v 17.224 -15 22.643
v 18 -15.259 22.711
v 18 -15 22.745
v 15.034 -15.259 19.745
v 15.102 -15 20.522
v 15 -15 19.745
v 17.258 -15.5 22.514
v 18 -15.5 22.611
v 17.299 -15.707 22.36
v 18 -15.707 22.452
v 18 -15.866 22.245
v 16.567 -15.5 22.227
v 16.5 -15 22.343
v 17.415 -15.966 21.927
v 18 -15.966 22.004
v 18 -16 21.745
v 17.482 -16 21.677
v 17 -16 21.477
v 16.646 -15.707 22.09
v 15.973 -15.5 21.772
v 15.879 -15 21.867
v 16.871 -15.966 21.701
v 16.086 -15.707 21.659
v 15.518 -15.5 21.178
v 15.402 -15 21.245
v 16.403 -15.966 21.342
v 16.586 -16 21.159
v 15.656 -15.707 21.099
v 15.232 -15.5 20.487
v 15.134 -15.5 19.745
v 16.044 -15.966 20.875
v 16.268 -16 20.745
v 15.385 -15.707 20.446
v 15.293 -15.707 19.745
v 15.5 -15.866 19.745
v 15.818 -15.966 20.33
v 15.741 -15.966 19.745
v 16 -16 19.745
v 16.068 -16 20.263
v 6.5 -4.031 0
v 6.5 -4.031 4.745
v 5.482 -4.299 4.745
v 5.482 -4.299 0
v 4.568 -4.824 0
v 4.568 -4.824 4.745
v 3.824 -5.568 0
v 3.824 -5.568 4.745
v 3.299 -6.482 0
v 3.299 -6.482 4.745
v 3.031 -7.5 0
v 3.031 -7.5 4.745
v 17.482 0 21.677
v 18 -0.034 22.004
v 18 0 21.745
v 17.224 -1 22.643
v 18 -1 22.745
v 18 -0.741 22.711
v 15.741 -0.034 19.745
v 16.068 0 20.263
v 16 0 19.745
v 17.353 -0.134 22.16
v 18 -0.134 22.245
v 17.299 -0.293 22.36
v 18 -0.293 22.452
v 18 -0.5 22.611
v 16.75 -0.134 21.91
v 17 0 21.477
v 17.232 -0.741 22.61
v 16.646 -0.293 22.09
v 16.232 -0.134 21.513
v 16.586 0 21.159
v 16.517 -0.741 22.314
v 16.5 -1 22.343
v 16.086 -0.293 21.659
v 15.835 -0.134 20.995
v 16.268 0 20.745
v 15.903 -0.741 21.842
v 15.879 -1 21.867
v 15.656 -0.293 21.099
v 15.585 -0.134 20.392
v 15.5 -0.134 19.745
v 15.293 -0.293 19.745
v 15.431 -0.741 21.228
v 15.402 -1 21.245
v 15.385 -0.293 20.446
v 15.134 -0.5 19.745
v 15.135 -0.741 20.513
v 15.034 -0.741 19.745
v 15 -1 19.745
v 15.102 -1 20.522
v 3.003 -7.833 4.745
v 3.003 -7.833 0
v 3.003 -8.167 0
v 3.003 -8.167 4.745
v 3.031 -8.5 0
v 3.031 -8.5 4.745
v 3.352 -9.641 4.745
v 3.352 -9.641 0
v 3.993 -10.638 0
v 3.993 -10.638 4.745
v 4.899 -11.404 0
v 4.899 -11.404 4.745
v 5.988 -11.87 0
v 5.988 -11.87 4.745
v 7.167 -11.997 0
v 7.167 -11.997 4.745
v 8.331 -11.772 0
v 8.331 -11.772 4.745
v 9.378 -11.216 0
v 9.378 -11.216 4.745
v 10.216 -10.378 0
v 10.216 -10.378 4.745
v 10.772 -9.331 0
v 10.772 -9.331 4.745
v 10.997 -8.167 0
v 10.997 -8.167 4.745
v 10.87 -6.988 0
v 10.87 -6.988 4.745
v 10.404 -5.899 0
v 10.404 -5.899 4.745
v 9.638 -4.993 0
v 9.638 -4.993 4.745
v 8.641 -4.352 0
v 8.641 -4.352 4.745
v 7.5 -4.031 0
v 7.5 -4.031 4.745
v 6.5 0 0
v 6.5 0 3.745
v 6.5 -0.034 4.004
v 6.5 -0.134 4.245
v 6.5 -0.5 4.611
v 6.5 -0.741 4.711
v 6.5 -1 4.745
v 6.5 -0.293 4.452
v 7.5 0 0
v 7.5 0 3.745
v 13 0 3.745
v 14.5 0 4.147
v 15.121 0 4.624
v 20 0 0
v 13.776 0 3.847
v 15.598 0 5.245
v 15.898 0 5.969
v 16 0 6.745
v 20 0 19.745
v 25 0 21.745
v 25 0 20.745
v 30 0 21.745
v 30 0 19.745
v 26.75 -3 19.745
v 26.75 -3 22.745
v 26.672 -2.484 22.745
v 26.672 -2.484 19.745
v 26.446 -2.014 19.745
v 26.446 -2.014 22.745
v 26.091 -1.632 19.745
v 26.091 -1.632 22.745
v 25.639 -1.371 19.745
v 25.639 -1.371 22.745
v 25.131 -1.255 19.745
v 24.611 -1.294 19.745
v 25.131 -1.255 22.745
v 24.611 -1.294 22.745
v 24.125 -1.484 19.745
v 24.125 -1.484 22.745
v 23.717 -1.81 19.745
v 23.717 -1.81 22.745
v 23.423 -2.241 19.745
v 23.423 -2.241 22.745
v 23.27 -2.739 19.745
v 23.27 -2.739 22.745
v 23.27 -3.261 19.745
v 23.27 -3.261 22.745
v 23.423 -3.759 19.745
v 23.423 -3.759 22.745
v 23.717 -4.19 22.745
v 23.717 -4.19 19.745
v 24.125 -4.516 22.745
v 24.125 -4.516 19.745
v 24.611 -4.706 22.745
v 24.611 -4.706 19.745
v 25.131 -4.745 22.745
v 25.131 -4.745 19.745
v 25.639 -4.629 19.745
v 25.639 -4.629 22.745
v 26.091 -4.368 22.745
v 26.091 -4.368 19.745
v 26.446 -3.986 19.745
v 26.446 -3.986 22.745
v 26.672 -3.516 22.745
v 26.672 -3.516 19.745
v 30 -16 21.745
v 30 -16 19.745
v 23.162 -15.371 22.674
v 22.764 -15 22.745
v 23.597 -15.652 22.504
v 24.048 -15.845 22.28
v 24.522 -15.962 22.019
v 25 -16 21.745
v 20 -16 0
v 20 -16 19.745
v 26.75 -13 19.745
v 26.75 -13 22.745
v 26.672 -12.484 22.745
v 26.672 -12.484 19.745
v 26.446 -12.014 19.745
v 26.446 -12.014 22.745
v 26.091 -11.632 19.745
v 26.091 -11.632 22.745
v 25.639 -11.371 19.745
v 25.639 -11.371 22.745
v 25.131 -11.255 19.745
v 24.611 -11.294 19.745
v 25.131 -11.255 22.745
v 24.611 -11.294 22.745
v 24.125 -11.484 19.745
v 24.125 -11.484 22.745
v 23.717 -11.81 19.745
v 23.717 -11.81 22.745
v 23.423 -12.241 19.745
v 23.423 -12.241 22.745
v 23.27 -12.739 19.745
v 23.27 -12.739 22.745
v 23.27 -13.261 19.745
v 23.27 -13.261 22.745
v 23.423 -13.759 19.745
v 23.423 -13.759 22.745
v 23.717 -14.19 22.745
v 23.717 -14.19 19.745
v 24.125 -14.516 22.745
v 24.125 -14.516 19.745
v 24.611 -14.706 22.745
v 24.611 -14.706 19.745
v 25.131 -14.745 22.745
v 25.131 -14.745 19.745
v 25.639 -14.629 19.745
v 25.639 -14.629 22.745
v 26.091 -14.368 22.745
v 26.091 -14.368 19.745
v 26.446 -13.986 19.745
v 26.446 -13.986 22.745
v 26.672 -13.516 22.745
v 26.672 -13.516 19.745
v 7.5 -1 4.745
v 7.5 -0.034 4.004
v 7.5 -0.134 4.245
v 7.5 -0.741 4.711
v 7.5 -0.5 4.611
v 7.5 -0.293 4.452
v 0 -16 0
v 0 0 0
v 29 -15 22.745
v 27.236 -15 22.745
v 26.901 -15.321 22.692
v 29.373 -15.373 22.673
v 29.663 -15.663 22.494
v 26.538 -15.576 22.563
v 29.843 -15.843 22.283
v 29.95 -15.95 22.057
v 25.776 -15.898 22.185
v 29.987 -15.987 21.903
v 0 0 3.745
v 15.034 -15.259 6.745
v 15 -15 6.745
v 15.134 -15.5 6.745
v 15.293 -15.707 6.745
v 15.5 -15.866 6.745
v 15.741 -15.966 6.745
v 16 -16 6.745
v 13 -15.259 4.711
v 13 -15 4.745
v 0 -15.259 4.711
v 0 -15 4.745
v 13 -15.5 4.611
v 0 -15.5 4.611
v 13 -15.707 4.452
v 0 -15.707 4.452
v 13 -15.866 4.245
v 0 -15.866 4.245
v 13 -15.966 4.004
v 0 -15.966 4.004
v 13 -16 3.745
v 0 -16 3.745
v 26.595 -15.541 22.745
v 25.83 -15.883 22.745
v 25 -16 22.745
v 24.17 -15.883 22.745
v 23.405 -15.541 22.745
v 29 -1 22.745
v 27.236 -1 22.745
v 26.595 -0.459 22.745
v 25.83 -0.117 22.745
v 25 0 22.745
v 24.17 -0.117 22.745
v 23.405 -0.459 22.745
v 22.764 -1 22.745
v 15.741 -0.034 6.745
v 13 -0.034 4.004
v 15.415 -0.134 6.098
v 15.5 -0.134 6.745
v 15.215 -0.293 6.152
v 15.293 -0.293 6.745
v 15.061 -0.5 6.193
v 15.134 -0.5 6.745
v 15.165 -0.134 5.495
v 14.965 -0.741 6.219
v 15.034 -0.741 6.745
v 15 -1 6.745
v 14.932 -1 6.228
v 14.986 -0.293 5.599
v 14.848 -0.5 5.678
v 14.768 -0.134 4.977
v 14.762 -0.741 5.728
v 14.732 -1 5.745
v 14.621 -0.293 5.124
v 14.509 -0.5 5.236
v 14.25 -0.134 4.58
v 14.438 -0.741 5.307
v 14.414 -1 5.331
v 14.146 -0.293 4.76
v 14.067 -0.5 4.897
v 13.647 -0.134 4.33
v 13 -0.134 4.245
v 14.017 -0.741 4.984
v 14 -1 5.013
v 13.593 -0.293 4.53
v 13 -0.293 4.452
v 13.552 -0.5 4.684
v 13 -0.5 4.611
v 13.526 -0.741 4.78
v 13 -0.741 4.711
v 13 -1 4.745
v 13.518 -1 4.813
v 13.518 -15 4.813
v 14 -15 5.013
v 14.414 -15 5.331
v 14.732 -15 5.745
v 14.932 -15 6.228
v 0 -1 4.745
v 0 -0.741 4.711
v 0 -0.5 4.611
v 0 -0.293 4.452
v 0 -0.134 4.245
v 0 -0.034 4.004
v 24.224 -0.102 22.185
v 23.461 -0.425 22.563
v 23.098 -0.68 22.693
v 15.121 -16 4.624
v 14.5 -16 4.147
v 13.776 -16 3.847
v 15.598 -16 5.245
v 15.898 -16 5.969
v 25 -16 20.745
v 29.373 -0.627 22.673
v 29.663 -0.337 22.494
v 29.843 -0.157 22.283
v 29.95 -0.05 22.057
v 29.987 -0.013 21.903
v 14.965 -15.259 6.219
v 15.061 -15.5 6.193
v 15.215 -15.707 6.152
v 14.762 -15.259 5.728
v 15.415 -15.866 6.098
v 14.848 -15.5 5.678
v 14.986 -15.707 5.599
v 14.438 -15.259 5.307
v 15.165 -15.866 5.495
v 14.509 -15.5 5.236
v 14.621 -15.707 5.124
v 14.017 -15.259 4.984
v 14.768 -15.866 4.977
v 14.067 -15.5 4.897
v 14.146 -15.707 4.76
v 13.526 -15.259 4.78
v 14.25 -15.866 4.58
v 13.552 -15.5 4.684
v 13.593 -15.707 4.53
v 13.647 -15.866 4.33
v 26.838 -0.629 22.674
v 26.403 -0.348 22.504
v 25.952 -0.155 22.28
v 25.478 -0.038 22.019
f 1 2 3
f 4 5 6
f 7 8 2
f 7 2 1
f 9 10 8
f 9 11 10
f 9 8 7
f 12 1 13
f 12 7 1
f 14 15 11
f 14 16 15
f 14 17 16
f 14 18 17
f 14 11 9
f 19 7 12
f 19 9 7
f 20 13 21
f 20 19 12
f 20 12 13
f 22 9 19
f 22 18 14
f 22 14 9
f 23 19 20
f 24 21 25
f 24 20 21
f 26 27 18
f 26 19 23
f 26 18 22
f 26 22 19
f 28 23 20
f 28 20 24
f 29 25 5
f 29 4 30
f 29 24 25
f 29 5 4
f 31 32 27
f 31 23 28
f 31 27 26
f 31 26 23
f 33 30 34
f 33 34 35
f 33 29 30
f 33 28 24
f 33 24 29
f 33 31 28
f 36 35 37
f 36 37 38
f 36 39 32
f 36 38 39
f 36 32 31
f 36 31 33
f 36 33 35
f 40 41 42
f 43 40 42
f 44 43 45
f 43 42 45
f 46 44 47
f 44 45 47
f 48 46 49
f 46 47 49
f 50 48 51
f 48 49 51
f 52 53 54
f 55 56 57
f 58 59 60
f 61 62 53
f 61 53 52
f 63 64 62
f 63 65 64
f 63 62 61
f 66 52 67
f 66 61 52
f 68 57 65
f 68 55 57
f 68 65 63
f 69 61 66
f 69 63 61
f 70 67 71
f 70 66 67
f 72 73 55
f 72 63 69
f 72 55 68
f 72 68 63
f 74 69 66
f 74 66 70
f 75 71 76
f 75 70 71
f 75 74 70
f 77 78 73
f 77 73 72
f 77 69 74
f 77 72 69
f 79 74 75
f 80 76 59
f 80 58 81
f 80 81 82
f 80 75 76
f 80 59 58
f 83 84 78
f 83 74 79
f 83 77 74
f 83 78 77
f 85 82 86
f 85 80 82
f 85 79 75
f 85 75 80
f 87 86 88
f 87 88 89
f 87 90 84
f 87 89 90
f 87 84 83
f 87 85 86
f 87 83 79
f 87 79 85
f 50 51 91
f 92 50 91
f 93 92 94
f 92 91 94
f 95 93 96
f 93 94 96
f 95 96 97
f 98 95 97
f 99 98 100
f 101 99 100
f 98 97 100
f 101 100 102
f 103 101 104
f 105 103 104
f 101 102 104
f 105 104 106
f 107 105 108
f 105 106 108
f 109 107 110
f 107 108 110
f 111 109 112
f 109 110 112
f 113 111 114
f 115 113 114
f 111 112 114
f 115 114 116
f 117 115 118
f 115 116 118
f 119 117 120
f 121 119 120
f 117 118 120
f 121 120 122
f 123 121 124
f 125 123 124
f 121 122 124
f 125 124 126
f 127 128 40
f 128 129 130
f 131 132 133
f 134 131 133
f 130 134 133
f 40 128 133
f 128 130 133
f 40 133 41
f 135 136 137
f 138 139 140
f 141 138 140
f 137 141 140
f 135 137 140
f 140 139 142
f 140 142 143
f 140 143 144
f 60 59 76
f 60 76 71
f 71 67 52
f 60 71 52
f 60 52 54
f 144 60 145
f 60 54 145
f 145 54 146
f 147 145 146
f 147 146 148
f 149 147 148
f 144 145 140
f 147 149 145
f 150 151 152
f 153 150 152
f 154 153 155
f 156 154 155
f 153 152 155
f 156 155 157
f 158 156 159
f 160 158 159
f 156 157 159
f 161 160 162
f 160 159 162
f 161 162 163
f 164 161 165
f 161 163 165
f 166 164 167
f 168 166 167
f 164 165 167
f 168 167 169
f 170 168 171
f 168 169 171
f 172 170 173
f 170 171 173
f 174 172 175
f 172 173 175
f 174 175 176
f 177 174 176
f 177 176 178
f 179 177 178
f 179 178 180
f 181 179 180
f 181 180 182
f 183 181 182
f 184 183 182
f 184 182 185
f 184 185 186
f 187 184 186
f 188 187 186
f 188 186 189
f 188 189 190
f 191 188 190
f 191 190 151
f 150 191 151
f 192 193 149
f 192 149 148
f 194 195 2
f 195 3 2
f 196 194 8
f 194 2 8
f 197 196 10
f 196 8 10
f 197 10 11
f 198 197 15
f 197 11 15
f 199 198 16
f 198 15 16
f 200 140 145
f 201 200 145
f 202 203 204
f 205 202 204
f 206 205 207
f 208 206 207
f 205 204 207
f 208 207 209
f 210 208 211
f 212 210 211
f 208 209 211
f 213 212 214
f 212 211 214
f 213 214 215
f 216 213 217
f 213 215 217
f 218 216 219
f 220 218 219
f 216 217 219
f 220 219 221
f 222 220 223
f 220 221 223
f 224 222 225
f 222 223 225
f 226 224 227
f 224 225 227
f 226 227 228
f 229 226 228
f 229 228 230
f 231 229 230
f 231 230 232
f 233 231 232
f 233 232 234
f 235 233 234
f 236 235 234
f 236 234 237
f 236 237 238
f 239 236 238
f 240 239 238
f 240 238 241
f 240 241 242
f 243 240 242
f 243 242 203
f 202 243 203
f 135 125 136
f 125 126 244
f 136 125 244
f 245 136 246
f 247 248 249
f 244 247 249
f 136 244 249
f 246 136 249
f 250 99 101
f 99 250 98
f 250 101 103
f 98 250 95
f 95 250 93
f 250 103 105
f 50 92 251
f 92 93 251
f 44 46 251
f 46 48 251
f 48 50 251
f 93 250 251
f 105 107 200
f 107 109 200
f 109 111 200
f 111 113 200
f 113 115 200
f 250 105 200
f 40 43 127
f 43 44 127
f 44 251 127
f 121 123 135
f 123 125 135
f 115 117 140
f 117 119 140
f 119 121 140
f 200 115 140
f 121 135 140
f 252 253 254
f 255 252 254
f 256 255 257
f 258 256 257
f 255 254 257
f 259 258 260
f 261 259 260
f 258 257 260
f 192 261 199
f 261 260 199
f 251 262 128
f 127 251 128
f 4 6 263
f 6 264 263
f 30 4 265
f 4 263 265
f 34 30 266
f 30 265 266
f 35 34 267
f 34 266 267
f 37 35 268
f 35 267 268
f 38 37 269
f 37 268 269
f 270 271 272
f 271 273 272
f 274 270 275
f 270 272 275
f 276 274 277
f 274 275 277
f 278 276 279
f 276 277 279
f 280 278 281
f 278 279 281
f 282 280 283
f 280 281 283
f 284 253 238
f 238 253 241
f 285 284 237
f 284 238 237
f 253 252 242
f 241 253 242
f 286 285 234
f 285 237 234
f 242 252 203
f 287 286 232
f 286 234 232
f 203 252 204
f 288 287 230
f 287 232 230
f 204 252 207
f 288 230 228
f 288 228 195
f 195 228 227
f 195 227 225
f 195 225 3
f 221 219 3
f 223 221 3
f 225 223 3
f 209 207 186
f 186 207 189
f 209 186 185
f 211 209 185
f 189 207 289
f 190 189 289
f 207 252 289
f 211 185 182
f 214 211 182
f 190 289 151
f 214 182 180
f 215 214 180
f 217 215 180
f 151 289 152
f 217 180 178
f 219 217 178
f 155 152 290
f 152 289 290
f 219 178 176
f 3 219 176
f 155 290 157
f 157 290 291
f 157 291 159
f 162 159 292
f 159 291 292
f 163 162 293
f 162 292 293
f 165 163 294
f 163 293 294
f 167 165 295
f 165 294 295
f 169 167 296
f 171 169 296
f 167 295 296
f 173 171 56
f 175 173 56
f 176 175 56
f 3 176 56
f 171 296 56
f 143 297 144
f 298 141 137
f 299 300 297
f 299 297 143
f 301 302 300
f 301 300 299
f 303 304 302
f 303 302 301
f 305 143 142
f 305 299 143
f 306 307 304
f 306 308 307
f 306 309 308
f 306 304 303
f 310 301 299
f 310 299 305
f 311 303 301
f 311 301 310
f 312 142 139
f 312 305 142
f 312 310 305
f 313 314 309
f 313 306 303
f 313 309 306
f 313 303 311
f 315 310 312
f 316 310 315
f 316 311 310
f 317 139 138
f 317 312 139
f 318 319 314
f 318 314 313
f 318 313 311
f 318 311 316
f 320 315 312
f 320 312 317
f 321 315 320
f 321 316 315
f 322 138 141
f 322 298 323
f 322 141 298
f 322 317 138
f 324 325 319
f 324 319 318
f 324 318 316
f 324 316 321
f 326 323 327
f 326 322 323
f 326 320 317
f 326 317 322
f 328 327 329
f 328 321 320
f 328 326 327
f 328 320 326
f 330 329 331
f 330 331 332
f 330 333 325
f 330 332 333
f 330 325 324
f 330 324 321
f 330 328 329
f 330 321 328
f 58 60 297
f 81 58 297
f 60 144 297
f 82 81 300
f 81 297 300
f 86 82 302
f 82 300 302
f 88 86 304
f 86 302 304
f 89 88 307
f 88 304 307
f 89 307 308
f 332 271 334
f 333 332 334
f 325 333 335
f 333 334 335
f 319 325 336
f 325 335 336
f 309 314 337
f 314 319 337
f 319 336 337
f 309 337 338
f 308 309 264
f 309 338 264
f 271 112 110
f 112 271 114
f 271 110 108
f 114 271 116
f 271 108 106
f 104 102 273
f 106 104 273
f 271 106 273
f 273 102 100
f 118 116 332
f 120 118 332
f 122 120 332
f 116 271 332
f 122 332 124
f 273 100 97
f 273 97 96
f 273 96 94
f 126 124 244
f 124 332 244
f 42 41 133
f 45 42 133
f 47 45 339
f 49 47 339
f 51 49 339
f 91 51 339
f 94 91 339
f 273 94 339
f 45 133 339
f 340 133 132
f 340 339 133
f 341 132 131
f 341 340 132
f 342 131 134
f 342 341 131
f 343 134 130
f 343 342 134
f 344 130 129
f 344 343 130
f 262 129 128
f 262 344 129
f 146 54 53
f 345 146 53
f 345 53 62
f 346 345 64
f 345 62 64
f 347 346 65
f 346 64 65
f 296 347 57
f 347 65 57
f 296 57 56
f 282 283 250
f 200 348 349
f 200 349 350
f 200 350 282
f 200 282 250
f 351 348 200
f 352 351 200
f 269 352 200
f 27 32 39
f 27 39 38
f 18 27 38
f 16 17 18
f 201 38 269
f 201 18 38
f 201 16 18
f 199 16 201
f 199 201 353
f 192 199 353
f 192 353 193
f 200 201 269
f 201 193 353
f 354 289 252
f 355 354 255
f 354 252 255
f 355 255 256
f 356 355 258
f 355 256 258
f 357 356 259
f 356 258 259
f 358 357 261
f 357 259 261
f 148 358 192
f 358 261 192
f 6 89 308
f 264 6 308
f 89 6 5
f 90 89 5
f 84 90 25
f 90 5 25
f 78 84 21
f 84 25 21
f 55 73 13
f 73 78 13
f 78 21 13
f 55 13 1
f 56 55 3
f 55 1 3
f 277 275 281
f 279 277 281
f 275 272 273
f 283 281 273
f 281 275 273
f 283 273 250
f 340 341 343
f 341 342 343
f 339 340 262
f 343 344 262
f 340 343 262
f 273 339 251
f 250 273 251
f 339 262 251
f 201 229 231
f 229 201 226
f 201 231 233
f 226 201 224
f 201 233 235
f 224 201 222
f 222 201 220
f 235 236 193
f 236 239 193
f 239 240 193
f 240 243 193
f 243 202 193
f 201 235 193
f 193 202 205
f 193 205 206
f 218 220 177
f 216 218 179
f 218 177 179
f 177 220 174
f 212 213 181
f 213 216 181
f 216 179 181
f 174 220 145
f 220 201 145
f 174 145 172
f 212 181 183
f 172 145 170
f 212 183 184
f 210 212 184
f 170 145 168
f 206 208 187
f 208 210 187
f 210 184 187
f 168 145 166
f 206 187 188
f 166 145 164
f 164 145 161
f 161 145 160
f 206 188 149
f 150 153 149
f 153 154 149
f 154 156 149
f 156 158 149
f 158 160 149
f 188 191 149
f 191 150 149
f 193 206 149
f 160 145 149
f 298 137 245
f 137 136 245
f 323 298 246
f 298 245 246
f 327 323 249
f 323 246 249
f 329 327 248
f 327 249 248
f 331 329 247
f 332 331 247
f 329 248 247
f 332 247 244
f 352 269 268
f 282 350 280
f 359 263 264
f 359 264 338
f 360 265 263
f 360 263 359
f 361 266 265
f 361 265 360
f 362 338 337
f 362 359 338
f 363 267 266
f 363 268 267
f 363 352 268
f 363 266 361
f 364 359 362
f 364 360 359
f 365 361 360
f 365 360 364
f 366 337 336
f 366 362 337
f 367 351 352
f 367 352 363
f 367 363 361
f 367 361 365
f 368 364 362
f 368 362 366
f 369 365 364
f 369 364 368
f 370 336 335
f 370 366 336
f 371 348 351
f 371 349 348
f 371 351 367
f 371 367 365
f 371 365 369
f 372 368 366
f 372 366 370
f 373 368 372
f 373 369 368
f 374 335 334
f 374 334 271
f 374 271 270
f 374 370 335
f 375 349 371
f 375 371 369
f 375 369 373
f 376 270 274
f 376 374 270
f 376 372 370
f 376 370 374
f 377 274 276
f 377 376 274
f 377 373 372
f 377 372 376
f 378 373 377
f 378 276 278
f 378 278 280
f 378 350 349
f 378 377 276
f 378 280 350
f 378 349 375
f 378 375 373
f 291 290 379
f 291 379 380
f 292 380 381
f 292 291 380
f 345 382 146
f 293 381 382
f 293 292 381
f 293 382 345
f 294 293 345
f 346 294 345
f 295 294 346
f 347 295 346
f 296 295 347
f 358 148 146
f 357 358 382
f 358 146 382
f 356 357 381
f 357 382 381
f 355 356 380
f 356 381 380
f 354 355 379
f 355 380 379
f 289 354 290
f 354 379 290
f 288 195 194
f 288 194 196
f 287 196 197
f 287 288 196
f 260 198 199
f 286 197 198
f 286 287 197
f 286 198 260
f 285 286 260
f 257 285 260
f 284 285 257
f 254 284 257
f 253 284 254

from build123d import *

# Parameters (mm, degrees)
F1_DEPTH  = 16
F2_R      = 1.75
F3_DEPTH  = 25
F5_DEPTH  = 25
F6_R      = 2
F7_R      = 3
F8_R      = 1
F9_R      = 3
F9_R_2    = 1.75
F10_DEPTH = 2
F11_R     = 1


with BuildPart() as f1:
    # F0 (on Front) → F1 (new body)
    with BuildSketch(Plane.XZ):
        Polygon((0, 4.745212), (0, 0), (20, 0), (20, 19.745212), (30, 19.745212), (30, 22.745212), (15, 22.745212), (15, 4.745212), align=None)
    extrude(amount=F1_DEPTH)

    # F2 (on face) → F3 (cut)
    with BuildSketch(Plane.XY.offset(22.745212)):
        with Locations((25, -3)):
            Circle(F2_R)
        with Locations((25, -13)):
            Circle(F2_R)
    extrude(amount=-F3_DEPTH, mode=Mode.SUBTRACT)

    # F4 (on face) → F5 (cut)
    with BuildSketch(Plane.XY.offset(4.745212)):
        with BuildLine():
            ThreePointArc((3.031373, -7.5), (3, -8), (3.031373, -8.5))
            ThreePointArc((3.031373, -8.5), (9.828427, -10.828427), (7.5, -4.031373))
            ThreePointArc((7.5, -4.031373), (7, -4), (6.5, -4.031373))
            ThreePointArc((6.5, -4.031373), (4.171573, -5.171573), (3.031373, -7.5))
        make_face()
        with BuildLine():
            ThreePointArc((6.5, -4.031373), (7, -4), (7.5, -4.031373))
            Line((7.5, -4.031373), (7.5, 0.274567))
            Line((7.5, 0.274567), (6.5, 0.274567))
            Line((6.5, 0.274567), (6.5, -4.031373))
        make_face()
    extrude(amount=-F5_DEPTH, mode=Mode.SUBTRACT)

    # F6
    f6_edges = [f1.edges().sort_by_distance(p)[0] for p in [
        (15, -8, 4.745212),
    ]]
    fillet(f6_edges, radius=F6_R)

    # F7
    f7_edges = [f1.edges().sort_by_distance(p)[0] for p in [
        (15, -8, 22.745212),
    ]]
    fillet(f7_edges, radius=F7_R)

    # F8
    f8_edges = [f1.edges().sort_by_distance(p)[0] for p in [
        (30, -8, 22.745212),
        (24, -16, 22.745212),
        (24, 0, 22.745212),
    ]]
    fillet(f8_edges, radius=F8_R)

    # F9 (on face) → F10 (join)
    with BuildSketch(Plane.XY.offset(22.745212)):
        with Locations((25, -3)):
            Circle(F9_R)
        with Locations((25, -3)):
            Circle(F9_R_2, mode=Mode.SUBTRACT)
        with Locations((25, -13)):
            Circle(F9_R)
        with Locations((25, -13)):
            Circle(F9_R_2, mode=Mode.SUBTRACT)
    extrude(amount=-F10_DEPTH)

    # F11
    f11_edges = [f1.edges().sort_by_distance(p)[0] for p in [
        (3.25, 0, 4.745212),
    ]]
    fillet(f11_edges, radius=F11_R)


solid = f1.part
